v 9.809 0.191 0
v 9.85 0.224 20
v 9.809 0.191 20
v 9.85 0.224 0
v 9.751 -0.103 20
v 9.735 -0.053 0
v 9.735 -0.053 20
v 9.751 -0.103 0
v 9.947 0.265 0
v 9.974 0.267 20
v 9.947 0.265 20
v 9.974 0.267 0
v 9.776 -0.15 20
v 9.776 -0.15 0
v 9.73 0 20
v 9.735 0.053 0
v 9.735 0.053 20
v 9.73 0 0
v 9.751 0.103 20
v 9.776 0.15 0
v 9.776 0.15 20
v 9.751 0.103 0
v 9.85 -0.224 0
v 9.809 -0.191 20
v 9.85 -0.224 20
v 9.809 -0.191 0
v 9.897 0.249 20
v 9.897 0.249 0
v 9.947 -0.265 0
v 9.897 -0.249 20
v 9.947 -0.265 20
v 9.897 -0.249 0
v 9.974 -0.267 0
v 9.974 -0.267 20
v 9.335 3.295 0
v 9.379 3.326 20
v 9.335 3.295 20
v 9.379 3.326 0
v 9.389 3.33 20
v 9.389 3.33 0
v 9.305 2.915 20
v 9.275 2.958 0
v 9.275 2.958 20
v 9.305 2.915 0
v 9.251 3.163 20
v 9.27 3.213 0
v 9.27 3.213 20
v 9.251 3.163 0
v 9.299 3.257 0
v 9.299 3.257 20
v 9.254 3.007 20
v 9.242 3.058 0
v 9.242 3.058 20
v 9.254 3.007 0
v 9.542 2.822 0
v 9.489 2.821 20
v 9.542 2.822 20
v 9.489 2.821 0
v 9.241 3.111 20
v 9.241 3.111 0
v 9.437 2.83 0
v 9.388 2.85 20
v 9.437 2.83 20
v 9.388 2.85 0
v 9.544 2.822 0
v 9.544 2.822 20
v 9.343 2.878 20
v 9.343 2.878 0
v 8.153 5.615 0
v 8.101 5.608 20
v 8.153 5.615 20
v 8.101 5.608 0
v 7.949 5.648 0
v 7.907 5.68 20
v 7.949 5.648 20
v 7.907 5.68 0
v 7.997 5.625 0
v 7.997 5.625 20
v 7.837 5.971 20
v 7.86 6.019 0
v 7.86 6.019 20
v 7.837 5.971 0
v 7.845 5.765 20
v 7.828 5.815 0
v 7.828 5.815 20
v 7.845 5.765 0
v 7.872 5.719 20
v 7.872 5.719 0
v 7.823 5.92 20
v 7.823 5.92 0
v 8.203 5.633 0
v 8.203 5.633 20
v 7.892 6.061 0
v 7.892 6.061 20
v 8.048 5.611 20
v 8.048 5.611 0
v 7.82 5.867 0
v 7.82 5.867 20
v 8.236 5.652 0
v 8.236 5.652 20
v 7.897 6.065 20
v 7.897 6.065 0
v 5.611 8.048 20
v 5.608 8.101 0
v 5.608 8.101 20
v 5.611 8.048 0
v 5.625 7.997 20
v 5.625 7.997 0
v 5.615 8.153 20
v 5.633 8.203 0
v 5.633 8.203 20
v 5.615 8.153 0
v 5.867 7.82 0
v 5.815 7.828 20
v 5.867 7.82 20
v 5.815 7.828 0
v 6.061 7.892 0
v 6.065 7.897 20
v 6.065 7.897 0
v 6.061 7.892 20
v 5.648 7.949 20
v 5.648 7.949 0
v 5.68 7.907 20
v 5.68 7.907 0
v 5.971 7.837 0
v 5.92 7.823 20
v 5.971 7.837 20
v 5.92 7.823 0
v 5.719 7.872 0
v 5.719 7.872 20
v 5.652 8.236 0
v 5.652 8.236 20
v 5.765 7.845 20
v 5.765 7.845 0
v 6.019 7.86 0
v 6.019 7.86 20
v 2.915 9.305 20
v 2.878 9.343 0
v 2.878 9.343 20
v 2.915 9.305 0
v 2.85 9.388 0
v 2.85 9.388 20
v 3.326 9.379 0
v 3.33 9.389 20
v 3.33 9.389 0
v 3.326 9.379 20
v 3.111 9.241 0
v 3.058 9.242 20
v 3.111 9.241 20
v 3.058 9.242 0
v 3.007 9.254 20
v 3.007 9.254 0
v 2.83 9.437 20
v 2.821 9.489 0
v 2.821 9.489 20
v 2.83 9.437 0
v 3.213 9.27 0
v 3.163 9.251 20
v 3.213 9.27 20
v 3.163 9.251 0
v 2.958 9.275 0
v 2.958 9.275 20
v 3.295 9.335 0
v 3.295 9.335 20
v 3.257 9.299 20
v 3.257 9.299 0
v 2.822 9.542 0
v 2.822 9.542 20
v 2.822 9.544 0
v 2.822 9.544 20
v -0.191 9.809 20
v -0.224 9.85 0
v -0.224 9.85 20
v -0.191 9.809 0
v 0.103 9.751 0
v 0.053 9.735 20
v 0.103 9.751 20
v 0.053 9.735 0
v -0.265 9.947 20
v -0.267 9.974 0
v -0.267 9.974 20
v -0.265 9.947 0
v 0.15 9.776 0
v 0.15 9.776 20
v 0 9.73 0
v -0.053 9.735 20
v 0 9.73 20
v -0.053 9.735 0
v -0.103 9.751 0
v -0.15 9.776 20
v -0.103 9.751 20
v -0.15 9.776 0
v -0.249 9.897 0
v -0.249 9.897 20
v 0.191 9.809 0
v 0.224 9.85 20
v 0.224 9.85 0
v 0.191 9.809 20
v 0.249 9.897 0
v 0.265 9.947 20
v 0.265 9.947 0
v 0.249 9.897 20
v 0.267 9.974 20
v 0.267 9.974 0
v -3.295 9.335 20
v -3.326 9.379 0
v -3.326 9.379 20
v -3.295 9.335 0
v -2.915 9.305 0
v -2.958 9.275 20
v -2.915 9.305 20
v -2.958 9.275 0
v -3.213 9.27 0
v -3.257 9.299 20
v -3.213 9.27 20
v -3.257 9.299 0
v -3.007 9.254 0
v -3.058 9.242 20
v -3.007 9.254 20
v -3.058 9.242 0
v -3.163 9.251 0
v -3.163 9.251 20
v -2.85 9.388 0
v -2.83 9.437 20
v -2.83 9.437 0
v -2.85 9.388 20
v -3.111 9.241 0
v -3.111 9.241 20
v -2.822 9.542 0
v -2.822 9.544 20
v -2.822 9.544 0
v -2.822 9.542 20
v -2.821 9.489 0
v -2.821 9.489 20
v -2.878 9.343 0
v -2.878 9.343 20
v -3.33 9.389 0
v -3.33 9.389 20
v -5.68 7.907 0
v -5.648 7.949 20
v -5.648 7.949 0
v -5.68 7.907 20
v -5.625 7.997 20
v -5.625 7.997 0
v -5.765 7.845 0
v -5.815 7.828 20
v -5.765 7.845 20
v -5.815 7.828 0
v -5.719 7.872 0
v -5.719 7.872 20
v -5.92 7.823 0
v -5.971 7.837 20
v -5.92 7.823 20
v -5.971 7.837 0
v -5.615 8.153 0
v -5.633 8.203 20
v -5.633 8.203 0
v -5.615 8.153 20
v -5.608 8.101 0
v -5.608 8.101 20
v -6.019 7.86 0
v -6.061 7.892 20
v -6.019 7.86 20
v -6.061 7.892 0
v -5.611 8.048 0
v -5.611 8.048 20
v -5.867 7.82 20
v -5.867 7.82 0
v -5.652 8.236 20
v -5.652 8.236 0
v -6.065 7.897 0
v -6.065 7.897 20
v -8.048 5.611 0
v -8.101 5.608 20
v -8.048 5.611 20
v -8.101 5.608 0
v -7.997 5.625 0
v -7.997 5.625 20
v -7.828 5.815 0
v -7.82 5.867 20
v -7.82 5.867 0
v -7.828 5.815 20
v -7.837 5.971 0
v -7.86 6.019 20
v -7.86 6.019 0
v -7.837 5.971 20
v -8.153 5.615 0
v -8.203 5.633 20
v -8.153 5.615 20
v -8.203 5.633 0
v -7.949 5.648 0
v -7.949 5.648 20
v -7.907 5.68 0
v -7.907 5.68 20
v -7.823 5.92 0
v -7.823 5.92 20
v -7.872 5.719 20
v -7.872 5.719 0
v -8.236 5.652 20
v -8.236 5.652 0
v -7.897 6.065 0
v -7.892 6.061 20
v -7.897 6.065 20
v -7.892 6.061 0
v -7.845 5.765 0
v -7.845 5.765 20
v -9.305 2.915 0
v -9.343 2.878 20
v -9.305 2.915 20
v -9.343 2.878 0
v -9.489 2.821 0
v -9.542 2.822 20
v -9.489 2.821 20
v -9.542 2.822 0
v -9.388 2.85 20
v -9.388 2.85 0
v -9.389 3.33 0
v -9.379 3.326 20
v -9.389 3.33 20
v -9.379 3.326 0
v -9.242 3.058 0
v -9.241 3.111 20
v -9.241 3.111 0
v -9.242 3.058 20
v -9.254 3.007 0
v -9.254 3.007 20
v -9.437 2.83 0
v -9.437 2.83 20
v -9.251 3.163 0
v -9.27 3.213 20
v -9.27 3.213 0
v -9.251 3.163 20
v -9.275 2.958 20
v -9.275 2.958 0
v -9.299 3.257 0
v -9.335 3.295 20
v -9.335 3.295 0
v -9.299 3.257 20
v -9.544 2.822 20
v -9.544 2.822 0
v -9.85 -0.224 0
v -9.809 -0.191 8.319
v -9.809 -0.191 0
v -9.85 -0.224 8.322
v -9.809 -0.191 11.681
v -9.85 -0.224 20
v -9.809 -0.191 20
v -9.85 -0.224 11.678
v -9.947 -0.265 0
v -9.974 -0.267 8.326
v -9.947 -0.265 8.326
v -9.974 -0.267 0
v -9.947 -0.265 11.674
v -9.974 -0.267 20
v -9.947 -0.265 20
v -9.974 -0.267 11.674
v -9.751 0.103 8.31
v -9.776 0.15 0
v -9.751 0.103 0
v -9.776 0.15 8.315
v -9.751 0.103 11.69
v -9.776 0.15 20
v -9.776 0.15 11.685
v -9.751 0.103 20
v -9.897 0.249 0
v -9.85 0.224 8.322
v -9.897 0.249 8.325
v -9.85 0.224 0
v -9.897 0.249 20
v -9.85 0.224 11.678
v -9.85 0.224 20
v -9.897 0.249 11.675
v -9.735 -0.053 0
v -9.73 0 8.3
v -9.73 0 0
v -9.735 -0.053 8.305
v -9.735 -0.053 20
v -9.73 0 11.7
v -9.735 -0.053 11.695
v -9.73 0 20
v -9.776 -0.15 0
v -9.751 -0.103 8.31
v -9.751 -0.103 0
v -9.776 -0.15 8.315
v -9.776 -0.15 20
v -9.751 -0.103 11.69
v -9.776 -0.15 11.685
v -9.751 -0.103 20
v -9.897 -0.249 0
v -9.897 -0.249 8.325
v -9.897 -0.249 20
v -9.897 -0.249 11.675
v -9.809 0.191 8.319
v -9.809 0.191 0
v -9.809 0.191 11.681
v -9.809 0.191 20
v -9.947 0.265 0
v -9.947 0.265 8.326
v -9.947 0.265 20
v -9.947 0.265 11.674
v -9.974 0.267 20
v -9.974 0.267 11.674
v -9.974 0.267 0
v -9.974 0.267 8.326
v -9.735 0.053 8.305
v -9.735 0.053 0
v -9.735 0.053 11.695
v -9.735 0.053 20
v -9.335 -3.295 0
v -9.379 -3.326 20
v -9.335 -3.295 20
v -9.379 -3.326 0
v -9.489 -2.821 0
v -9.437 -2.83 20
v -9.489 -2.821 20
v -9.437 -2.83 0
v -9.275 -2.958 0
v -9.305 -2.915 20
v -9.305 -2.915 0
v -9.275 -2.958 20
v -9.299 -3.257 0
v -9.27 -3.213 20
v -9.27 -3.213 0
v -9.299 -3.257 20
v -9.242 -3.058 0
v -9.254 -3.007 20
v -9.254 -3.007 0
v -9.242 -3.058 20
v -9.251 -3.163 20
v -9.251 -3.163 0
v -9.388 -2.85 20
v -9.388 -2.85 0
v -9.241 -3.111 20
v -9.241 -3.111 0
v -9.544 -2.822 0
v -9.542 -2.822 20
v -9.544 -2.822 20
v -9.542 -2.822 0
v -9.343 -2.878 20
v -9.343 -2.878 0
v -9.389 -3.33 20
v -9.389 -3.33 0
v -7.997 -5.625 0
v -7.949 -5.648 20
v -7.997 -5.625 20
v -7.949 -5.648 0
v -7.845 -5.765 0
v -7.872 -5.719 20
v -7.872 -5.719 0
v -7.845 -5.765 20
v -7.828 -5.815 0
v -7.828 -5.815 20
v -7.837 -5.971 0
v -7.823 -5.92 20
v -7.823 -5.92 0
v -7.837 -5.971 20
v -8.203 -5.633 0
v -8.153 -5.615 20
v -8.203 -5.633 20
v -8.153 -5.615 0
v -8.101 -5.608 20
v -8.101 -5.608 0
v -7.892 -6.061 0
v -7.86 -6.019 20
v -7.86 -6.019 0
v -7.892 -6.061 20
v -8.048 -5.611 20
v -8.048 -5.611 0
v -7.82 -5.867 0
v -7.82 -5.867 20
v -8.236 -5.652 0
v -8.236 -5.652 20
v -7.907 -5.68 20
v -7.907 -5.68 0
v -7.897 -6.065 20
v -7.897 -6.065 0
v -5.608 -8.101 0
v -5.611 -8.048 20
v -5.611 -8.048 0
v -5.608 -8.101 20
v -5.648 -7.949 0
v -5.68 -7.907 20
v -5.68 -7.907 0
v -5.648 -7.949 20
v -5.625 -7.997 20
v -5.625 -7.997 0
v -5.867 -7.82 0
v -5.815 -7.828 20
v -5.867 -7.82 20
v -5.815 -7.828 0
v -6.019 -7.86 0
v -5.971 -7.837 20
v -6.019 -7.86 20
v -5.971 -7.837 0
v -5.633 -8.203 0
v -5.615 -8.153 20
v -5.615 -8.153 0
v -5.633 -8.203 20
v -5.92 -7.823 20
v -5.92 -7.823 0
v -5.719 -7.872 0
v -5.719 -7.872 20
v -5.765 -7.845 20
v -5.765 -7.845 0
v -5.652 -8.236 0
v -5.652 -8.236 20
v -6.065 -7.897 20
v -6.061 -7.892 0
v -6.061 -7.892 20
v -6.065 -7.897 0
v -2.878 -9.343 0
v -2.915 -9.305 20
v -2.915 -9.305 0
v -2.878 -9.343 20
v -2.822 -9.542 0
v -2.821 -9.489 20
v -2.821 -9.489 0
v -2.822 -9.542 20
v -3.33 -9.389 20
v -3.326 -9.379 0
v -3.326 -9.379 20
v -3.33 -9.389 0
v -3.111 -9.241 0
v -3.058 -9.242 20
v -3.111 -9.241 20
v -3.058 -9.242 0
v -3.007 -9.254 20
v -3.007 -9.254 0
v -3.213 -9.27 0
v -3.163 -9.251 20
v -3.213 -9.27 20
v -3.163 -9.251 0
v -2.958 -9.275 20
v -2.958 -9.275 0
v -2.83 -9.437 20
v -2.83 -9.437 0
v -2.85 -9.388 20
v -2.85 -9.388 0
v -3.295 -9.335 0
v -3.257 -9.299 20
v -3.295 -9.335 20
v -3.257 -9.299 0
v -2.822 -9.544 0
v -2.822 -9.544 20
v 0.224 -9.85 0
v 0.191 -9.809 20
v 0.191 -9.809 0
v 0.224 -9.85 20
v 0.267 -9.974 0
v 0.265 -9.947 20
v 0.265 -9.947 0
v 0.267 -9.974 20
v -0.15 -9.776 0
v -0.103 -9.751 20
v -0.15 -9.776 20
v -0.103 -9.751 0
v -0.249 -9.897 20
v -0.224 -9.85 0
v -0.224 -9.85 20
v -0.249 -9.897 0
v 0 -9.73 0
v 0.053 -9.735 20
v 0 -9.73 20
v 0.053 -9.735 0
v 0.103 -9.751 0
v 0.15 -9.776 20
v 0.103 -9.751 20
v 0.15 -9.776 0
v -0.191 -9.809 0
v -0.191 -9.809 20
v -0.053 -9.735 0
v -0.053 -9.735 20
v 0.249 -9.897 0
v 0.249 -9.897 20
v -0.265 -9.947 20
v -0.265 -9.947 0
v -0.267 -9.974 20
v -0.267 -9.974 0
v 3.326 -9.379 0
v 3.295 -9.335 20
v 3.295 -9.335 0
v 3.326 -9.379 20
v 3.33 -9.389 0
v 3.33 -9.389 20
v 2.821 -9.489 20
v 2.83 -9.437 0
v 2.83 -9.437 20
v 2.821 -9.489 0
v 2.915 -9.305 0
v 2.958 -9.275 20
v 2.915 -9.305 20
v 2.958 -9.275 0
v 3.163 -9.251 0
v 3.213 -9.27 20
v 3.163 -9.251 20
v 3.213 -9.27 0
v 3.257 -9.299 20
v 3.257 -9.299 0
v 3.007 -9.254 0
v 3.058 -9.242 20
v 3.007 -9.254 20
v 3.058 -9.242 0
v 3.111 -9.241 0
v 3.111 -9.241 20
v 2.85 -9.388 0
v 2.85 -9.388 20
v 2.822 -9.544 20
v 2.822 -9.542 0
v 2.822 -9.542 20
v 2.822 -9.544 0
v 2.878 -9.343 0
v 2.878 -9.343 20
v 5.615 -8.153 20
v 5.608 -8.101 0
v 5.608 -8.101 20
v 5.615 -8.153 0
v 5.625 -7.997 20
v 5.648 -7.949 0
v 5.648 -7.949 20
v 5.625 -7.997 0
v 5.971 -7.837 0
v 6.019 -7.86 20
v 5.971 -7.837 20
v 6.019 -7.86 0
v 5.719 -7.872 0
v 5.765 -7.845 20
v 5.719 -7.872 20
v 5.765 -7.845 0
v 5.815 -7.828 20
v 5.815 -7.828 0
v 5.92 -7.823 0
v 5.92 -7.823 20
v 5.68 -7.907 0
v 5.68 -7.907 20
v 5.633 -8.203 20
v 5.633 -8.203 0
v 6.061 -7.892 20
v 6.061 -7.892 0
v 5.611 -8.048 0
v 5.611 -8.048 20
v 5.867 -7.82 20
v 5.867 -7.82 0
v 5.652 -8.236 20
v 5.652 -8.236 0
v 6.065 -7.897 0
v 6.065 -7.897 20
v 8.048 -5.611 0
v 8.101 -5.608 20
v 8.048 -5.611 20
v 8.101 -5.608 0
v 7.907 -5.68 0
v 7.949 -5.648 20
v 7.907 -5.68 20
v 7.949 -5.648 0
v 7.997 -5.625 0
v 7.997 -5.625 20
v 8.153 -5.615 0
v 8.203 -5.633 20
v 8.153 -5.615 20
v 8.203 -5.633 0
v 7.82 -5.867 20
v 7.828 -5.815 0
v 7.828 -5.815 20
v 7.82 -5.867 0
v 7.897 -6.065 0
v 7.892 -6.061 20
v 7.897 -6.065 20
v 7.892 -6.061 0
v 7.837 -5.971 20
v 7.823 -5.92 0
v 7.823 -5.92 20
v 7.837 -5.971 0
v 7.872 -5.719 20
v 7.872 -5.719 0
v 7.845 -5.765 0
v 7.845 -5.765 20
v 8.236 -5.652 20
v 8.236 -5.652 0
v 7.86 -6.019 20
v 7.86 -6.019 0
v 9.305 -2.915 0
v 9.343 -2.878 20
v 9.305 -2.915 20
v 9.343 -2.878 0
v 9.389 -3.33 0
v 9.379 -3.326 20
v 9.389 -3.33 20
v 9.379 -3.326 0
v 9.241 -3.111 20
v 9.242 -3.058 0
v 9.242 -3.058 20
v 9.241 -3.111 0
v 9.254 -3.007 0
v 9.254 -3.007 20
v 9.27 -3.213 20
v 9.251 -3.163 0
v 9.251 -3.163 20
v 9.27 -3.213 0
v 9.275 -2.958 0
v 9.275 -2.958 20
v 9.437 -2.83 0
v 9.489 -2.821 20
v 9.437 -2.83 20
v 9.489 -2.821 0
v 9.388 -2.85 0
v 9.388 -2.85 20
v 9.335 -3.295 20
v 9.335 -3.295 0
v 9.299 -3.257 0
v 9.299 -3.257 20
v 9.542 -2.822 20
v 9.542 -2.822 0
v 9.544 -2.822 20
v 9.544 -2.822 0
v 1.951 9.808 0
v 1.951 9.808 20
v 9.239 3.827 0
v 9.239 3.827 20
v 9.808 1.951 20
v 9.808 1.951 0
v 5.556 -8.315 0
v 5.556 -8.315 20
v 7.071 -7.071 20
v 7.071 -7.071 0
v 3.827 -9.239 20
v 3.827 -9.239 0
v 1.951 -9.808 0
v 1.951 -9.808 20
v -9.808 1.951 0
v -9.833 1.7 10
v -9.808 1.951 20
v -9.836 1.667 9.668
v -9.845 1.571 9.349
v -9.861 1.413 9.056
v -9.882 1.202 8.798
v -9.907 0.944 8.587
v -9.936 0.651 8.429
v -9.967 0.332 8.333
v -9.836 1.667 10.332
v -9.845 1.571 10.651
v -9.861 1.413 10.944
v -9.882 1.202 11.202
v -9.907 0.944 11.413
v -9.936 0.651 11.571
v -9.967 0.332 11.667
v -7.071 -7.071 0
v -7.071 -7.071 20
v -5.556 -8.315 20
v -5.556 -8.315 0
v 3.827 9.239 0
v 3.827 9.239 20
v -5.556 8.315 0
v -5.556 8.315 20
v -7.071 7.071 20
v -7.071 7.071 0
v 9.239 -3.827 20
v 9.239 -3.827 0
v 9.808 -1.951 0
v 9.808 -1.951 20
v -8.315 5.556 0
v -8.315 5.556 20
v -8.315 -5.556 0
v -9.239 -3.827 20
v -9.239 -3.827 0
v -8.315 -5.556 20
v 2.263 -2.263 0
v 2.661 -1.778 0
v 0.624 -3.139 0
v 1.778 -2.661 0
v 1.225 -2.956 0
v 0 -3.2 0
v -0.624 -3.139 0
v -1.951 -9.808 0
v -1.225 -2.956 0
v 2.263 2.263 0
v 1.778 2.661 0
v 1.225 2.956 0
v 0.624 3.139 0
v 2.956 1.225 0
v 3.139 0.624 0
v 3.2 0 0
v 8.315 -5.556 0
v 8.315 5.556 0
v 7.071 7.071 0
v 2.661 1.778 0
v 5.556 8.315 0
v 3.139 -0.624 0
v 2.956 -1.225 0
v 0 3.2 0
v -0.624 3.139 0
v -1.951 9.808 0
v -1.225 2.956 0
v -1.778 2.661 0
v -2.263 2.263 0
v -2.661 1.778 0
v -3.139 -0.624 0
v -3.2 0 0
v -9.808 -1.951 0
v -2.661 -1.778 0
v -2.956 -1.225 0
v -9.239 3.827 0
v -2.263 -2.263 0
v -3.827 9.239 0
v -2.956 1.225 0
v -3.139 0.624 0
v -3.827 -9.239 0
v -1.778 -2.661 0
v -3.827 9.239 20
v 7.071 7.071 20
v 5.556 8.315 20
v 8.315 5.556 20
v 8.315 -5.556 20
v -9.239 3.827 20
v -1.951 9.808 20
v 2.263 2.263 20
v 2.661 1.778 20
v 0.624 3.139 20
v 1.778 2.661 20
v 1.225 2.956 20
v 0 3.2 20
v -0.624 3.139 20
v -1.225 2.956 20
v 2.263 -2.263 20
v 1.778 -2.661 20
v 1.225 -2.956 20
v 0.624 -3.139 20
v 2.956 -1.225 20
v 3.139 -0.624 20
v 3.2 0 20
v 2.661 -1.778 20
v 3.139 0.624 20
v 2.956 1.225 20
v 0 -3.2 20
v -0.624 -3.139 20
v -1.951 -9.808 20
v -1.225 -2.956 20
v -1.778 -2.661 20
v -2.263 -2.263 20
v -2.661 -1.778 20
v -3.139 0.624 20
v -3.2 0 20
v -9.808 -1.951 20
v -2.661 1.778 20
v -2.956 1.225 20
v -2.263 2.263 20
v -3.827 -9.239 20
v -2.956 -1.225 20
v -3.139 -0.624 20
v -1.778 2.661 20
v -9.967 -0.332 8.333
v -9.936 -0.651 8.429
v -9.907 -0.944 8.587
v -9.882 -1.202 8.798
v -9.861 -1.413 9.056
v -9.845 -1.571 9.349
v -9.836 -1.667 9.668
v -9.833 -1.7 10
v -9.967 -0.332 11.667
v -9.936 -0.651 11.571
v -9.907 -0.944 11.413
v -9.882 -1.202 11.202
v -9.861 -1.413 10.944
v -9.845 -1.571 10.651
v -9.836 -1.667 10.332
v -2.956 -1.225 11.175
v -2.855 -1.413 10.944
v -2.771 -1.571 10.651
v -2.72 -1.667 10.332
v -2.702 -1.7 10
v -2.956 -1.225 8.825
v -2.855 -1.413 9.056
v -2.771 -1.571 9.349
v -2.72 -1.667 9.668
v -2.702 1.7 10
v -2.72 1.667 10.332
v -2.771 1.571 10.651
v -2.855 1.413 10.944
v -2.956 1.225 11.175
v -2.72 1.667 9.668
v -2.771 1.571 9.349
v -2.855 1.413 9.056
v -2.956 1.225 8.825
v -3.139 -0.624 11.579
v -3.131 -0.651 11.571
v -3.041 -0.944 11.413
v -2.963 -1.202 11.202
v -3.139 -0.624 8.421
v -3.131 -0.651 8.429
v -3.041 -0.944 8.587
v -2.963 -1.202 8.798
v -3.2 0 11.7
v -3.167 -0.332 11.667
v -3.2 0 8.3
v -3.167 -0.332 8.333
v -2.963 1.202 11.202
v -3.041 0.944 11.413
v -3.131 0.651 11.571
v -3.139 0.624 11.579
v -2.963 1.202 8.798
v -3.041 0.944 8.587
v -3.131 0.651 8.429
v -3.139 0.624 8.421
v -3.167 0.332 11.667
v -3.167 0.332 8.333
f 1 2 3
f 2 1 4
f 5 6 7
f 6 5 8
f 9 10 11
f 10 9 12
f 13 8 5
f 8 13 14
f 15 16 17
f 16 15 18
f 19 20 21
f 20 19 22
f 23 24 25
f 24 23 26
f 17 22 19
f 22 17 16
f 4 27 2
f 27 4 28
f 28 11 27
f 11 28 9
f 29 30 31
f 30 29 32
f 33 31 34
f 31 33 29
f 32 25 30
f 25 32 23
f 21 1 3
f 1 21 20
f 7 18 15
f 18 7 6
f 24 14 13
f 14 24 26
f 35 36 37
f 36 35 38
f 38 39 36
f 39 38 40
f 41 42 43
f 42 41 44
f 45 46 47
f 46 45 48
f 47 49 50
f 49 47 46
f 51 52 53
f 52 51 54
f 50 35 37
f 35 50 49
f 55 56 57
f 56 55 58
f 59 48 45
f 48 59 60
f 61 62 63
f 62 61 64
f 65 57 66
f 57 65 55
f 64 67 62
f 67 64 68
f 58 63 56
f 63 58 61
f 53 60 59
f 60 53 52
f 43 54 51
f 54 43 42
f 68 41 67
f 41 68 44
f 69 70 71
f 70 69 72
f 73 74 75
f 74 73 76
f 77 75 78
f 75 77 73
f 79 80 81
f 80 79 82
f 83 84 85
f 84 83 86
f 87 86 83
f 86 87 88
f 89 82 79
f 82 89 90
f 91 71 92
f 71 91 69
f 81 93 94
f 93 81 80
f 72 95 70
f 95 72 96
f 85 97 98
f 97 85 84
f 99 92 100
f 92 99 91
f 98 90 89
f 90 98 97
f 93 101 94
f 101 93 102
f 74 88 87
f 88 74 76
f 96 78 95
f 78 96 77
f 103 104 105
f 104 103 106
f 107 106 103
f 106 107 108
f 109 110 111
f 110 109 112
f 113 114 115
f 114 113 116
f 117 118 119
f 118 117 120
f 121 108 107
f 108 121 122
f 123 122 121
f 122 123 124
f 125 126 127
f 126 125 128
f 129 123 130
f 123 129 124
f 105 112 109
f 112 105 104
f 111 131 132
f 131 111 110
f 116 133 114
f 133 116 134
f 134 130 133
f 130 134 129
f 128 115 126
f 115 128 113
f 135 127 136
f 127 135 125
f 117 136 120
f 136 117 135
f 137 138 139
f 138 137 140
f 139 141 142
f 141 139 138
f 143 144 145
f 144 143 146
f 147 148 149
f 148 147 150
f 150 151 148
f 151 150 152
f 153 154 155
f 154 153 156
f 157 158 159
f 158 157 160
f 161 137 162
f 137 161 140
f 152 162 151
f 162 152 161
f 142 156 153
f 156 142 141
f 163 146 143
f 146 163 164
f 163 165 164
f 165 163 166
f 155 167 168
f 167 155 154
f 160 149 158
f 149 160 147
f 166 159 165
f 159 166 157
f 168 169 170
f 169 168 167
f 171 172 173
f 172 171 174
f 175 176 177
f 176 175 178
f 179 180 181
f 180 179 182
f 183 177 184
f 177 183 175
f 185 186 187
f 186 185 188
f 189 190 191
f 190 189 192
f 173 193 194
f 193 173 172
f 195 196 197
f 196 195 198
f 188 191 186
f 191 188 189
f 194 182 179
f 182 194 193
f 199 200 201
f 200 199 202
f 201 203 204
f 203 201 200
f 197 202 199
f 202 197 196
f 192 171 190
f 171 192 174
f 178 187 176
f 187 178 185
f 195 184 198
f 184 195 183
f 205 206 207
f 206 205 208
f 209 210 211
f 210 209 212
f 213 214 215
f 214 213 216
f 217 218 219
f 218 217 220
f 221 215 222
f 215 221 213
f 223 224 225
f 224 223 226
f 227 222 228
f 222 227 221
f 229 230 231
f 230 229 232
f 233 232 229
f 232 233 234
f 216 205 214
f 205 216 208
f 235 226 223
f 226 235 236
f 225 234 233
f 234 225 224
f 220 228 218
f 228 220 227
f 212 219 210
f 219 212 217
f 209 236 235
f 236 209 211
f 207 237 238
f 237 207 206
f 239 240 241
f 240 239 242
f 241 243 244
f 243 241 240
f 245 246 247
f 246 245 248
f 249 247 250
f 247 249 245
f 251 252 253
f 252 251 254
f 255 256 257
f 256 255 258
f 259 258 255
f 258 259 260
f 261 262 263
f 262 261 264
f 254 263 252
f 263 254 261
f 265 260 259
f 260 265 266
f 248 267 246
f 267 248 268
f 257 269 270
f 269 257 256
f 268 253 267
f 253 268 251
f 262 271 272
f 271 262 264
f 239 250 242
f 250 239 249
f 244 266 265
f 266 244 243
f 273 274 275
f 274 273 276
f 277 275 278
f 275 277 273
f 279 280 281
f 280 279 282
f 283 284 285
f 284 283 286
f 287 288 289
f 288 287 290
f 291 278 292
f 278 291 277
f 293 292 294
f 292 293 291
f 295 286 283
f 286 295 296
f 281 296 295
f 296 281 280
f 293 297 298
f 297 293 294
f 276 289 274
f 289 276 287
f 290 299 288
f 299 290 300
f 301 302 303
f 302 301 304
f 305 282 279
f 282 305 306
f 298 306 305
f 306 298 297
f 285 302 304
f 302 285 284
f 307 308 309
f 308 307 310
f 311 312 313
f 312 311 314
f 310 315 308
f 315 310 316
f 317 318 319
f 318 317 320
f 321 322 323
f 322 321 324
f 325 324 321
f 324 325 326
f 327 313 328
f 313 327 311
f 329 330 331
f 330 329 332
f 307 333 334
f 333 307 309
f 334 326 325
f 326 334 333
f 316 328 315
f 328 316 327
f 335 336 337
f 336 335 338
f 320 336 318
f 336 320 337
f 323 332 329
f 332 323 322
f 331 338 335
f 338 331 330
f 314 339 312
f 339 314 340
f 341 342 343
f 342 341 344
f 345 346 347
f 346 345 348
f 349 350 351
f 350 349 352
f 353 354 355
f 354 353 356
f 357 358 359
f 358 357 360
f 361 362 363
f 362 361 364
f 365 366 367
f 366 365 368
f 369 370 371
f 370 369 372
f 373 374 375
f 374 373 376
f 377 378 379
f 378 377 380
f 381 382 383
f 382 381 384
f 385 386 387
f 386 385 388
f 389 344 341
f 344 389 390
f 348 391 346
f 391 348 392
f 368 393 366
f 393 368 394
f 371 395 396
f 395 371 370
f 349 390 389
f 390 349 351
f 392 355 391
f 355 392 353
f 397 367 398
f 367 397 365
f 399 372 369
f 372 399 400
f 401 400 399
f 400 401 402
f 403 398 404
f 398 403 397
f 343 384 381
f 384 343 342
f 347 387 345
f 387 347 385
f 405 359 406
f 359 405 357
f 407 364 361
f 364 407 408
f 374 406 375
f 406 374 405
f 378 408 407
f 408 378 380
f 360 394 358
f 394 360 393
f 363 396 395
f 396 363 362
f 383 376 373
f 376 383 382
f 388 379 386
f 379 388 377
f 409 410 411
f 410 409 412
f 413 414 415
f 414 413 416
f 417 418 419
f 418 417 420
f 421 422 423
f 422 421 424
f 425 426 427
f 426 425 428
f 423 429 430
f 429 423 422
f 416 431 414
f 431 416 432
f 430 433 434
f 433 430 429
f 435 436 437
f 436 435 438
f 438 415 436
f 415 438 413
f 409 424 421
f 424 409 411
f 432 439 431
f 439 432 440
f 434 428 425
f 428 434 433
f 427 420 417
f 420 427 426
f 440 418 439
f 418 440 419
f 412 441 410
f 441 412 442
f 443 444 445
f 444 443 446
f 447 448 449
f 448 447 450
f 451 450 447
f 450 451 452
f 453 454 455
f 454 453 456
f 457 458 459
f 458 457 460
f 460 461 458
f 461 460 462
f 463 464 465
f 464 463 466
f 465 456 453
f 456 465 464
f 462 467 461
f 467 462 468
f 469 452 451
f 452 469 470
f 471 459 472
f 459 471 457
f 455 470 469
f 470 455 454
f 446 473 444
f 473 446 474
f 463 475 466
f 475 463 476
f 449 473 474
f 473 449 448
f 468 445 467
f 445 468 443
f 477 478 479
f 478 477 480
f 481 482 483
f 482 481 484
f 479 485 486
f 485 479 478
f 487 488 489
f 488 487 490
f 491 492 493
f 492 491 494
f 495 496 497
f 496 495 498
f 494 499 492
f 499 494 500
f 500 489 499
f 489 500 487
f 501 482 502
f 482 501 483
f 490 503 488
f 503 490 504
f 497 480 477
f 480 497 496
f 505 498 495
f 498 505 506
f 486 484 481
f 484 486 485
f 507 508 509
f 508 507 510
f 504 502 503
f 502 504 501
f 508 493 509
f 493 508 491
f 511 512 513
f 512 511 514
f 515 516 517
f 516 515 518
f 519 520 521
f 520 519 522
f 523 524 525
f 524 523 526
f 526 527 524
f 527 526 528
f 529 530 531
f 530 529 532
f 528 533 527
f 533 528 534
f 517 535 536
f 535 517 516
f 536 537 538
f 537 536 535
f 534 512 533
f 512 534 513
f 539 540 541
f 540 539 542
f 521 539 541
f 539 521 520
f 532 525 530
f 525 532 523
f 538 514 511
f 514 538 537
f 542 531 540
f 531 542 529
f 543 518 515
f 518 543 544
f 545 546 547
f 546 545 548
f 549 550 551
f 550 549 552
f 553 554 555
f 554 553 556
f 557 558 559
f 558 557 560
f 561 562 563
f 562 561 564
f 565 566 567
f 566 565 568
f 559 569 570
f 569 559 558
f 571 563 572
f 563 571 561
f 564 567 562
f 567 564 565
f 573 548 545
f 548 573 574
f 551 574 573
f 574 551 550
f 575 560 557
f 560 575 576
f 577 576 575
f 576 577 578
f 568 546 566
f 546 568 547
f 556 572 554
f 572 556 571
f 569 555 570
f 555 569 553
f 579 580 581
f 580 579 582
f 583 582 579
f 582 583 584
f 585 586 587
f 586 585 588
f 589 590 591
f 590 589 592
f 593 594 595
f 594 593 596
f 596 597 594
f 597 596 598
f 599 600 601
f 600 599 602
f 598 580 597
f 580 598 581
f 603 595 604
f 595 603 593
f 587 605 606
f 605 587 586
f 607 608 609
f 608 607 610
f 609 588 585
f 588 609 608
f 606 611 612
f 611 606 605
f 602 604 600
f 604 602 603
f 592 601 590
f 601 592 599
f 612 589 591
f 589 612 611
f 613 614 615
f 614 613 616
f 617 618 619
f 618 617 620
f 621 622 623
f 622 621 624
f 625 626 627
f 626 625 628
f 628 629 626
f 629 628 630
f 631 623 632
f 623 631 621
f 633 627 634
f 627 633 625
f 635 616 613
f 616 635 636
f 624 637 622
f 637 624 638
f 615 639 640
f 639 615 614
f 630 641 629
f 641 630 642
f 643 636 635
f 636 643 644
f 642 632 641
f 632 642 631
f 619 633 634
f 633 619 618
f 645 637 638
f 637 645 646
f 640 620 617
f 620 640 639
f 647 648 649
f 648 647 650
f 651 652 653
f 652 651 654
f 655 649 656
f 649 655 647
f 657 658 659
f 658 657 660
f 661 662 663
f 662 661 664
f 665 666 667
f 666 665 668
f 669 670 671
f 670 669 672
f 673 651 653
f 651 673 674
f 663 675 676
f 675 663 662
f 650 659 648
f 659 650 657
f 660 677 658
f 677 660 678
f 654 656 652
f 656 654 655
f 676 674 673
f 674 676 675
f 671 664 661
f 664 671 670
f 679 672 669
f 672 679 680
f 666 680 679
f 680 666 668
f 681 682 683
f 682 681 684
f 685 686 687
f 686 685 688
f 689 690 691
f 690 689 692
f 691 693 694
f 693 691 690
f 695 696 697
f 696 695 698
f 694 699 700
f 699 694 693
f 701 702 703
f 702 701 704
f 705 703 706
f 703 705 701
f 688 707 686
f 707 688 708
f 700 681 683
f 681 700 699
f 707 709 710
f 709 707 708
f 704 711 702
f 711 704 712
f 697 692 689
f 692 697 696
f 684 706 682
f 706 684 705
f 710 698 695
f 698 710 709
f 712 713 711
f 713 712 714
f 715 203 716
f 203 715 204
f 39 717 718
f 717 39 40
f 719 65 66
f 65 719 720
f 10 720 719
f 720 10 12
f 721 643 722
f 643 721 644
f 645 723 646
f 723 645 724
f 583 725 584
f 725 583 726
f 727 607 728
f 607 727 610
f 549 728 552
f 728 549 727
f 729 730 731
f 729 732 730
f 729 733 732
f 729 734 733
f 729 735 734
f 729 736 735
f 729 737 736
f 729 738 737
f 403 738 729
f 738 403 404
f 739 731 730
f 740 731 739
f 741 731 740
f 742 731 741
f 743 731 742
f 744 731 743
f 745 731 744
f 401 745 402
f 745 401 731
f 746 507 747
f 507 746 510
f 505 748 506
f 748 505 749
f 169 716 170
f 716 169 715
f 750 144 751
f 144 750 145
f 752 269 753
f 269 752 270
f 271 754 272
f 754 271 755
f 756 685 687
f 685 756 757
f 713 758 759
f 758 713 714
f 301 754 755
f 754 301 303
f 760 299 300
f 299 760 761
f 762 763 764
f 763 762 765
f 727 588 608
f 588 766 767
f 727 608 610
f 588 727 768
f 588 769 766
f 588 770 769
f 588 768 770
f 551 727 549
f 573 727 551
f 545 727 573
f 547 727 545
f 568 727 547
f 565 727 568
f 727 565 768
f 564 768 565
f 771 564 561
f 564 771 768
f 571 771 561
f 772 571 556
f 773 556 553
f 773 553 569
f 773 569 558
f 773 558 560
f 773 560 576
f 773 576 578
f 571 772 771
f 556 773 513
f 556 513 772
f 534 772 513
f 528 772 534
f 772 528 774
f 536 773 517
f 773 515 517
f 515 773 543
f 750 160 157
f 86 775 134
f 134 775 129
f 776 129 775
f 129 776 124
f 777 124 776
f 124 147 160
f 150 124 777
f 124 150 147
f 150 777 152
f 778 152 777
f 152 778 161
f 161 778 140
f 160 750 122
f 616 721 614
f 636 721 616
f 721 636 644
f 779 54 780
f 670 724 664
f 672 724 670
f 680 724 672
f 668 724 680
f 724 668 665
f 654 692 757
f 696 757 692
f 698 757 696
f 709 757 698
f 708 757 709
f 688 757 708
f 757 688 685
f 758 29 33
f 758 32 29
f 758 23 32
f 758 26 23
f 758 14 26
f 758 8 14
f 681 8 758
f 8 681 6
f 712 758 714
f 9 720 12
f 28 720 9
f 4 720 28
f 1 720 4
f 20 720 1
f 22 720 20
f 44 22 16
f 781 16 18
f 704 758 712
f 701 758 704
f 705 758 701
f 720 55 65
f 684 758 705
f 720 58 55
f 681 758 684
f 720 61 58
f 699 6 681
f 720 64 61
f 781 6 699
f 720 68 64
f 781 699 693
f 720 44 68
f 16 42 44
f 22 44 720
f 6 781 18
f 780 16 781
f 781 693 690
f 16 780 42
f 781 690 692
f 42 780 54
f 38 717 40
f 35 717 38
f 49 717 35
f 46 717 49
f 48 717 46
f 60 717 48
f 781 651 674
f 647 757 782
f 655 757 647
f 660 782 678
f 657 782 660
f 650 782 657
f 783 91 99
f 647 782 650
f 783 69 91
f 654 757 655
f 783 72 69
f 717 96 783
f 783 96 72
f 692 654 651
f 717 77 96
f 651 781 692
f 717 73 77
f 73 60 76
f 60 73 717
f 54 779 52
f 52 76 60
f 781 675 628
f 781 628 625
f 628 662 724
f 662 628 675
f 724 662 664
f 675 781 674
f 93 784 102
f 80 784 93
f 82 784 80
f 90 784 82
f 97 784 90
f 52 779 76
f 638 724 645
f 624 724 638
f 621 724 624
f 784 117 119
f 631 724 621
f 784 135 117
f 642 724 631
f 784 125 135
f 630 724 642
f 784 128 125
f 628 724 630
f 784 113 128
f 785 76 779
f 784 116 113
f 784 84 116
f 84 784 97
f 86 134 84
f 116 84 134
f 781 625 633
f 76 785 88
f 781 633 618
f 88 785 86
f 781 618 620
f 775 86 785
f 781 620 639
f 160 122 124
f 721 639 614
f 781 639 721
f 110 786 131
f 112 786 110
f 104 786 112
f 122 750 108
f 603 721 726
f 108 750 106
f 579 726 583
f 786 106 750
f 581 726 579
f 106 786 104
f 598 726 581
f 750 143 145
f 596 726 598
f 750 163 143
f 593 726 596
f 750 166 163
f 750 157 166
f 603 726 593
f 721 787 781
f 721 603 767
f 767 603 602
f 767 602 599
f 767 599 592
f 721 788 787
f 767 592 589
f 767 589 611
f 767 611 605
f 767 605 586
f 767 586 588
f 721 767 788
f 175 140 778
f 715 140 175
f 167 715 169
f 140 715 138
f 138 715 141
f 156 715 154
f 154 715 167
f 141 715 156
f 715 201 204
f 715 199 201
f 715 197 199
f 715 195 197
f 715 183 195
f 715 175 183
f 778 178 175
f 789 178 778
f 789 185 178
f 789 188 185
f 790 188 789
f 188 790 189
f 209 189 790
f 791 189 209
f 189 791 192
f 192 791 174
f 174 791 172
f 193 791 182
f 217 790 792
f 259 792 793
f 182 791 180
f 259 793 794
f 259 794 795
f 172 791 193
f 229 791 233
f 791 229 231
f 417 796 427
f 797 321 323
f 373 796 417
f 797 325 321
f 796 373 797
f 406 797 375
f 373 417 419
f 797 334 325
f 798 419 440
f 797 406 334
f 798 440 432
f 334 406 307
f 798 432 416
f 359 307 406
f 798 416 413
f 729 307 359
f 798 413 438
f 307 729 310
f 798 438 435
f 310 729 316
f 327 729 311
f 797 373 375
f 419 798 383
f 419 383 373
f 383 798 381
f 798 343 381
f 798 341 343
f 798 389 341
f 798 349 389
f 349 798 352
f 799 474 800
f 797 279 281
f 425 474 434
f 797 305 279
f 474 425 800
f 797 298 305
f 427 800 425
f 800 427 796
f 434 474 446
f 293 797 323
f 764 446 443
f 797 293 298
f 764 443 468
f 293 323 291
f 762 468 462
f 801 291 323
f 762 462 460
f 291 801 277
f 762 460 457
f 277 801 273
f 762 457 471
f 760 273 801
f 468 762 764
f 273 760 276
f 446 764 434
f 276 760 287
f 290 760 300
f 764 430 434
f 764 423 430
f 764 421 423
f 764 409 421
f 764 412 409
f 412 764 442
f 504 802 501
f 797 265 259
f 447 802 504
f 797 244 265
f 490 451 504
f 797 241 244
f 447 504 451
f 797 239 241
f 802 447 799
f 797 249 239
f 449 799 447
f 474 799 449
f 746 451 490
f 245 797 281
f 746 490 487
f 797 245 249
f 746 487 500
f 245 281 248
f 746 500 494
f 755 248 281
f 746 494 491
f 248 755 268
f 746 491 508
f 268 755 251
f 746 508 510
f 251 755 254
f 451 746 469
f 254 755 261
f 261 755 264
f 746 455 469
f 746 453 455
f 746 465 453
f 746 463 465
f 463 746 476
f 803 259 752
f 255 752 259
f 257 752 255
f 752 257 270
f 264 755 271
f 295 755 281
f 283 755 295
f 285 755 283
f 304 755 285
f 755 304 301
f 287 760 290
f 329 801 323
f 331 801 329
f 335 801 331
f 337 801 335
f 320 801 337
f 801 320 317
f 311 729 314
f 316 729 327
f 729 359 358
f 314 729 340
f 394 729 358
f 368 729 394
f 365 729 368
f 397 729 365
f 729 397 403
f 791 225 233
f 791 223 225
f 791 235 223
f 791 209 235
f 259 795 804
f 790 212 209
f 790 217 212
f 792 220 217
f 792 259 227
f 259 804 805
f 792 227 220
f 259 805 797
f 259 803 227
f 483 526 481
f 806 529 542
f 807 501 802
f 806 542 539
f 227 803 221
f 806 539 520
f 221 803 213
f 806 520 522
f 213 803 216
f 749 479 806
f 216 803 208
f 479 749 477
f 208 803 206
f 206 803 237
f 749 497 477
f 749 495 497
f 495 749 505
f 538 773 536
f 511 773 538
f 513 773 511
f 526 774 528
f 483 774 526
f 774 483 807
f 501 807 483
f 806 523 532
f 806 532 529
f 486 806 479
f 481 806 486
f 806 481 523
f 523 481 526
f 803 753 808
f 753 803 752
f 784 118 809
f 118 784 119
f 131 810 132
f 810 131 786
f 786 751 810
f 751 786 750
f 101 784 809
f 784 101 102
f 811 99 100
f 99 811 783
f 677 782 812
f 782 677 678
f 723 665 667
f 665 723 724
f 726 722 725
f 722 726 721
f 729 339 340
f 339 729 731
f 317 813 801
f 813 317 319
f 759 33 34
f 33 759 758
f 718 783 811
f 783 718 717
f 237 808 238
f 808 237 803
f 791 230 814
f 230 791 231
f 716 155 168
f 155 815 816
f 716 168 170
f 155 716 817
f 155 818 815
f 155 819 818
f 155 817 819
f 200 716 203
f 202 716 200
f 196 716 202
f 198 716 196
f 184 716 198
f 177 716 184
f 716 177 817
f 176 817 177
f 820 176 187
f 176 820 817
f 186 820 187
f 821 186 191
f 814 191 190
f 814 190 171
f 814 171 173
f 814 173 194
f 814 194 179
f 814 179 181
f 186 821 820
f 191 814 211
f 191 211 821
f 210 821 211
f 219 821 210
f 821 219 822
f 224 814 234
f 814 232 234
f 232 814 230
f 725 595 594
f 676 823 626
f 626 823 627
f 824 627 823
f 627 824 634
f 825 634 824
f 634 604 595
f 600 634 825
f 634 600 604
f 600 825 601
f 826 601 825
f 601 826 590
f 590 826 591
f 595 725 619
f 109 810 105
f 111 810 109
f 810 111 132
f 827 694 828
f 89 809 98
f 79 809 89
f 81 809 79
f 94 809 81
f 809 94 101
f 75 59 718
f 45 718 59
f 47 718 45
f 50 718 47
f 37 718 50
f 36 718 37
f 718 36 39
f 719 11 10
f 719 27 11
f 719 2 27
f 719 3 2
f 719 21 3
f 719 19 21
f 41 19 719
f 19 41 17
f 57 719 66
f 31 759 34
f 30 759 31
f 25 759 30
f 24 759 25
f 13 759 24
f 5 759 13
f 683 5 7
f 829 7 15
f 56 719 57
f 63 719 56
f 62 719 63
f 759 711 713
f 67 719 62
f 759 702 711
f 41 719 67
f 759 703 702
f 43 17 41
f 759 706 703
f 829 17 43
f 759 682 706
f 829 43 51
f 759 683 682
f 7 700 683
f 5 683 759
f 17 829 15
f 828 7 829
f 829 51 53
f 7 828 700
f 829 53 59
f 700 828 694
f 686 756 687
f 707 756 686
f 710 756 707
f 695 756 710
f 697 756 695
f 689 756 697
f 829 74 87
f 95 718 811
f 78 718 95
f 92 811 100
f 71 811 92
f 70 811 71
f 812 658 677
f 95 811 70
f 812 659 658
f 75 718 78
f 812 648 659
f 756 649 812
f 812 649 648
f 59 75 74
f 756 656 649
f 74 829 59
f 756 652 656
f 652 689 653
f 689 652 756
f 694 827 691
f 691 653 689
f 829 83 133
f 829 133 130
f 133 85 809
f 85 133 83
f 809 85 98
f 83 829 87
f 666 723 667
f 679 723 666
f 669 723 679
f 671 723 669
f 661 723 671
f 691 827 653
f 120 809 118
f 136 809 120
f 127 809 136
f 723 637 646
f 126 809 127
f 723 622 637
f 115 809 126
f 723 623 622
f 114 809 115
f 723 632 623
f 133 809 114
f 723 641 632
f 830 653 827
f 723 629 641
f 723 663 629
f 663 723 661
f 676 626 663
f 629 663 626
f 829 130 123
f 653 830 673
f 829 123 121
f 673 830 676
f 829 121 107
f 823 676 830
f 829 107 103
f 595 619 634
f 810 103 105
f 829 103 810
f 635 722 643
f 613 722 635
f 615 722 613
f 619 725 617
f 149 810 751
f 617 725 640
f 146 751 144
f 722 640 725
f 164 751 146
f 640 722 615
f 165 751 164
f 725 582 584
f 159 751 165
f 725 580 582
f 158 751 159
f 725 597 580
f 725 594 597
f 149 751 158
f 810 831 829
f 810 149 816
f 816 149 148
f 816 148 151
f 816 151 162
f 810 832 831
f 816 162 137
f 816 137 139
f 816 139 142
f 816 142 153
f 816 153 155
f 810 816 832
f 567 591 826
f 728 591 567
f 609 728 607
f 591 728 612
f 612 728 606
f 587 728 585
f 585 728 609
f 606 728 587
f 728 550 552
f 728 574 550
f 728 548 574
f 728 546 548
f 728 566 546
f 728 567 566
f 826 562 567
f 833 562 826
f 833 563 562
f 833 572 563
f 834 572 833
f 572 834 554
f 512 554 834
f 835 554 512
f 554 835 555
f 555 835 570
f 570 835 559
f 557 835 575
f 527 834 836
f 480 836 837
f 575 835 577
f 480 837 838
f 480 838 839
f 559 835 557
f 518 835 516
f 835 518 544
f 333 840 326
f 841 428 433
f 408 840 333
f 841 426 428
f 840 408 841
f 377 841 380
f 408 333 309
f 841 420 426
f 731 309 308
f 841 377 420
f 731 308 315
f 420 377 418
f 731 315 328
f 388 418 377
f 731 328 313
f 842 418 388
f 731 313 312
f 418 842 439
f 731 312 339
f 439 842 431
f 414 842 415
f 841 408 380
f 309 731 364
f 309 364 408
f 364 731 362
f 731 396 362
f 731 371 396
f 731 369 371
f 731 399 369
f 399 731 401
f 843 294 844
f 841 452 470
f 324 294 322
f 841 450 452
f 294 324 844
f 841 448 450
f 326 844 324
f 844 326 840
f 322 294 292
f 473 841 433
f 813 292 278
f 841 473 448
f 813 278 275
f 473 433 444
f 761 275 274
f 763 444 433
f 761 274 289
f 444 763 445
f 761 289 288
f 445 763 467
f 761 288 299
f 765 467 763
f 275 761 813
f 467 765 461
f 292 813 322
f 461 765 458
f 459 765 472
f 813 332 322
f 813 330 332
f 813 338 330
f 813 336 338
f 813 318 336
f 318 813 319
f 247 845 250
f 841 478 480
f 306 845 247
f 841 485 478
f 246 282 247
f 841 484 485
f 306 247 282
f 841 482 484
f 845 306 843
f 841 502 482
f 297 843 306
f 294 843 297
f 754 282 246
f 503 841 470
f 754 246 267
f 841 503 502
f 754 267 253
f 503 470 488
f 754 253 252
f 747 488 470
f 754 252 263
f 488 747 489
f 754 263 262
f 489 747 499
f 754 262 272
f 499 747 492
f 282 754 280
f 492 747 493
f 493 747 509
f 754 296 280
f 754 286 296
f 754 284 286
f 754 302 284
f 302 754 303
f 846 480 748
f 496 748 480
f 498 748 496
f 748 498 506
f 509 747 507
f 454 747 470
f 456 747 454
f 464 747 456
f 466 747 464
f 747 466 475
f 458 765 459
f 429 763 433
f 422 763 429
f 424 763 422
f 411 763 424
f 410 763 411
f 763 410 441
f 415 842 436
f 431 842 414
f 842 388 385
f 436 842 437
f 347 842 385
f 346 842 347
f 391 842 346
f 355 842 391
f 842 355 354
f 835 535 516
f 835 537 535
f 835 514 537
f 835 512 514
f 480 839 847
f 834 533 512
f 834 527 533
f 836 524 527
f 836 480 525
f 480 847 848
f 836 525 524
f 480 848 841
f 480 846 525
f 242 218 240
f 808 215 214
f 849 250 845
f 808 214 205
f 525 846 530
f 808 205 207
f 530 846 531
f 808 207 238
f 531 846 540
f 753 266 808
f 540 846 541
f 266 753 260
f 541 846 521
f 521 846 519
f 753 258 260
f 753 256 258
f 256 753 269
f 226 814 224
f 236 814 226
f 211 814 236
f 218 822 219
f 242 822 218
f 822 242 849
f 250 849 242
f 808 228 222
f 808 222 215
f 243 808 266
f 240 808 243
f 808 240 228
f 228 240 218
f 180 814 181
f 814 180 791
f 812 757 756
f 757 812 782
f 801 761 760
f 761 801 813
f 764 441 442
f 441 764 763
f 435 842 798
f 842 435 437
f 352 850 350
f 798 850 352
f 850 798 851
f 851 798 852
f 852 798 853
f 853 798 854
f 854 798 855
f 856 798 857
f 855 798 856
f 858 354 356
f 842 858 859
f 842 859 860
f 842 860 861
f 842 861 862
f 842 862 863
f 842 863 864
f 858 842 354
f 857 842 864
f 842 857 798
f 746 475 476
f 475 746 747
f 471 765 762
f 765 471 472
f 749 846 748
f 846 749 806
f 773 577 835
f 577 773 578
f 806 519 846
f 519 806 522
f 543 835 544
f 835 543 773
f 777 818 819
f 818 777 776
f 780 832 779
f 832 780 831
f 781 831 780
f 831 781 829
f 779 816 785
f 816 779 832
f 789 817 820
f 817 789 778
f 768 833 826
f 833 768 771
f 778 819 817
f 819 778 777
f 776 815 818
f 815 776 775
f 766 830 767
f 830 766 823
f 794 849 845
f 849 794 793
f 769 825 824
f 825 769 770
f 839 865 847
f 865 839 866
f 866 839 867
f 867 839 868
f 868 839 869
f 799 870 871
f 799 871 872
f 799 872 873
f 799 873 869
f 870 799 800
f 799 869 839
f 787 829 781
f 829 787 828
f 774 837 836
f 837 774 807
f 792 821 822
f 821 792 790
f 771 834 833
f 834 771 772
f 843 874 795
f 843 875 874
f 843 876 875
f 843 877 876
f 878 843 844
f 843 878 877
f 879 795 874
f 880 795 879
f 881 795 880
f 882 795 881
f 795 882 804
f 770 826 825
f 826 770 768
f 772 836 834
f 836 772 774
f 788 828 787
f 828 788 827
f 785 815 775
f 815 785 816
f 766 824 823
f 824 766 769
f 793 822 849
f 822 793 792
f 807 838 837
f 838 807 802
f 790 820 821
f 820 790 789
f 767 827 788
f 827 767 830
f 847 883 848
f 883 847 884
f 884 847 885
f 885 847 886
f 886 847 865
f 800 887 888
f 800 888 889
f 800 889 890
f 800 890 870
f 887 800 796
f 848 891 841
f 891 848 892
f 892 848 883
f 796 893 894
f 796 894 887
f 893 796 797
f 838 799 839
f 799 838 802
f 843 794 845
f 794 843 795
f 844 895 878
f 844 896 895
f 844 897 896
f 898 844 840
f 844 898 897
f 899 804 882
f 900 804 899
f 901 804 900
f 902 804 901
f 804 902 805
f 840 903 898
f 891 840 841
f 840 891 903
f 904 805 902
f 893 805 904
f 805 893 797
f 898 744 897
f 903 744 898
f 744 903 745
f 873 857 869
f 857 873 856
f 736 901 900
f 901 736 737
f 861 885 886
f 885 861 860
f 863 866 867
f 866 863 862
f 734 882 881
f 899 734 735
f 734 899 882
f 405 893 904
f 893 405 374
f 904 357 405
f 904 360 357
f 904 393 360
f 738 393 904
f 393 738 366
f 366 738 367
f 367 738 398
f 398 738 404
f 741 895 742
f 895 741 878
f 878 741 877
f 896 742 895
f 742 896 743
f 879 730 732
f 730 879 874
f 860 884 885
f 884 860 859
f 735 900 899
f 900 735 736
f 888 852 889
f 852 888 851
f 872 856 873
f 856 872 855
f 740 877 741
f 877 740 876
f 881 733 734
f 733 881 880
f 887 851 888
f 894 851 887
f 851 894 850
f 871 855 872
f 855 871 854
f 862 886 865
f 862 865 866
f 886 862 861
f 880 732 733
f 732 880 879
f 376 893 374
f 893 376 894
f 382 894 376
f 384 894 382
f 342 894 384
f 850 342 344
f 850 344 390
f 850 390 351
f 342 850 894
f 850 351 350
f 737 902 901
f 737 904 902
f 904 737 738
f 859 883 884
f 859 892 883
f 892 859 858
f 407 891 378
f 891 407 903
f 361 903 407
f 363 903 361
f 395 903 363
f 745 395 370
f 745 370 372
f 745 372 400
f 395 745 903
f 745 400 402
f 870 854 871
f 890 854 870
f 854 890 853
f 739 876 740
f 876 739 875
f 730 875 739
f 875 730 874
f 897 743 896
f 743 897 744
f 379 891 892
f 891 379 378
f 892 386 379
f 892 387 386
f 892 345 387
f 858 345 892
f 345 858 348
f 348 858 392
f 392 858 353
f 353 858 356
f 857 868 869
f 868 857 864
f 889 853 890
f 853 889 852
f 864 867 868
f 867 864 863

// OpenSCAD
$fn = 32;

// ----------------------------------------------------------------------
// Hand knob: 20 x 20 x 20 mm
// ----------------------------------------------------------------------

// --- parameters (mm) ---
grip_d = 20;              // knob diameter
grip_h = 20;              // knob height
shaft_d = 6.4;            // shaft bore
set_d = 3.4;              // set screw tap hole
knurl_dia = 0.54;         // knurl groove diameter
knurl_n = 20;             // number of knurl grooves

module body() {
  cylinder(h = grip_h, d = grip_d);
}

difference() {
  union() {
    body();
  }
  translate([0, 0, -1]) cylinder(h = grip_h + 0 + 2, d = shaft_d);
  /* knurl grooves */
  for (i = [0 : knurl_n - 1])
    rotate([0, 0, i * 360 / knurl_n])
      translate([grip_d / 2, 0, -0.5])
        cylinder(h = grip_h + 1, d = knurl_dia);
  translate([-grip_d / 2 - 1, 0, grip_h * 0.5]) rotate([0, 90, 0]) cylinder(h = grip_d / 2 + 2, d = set_d);
}
